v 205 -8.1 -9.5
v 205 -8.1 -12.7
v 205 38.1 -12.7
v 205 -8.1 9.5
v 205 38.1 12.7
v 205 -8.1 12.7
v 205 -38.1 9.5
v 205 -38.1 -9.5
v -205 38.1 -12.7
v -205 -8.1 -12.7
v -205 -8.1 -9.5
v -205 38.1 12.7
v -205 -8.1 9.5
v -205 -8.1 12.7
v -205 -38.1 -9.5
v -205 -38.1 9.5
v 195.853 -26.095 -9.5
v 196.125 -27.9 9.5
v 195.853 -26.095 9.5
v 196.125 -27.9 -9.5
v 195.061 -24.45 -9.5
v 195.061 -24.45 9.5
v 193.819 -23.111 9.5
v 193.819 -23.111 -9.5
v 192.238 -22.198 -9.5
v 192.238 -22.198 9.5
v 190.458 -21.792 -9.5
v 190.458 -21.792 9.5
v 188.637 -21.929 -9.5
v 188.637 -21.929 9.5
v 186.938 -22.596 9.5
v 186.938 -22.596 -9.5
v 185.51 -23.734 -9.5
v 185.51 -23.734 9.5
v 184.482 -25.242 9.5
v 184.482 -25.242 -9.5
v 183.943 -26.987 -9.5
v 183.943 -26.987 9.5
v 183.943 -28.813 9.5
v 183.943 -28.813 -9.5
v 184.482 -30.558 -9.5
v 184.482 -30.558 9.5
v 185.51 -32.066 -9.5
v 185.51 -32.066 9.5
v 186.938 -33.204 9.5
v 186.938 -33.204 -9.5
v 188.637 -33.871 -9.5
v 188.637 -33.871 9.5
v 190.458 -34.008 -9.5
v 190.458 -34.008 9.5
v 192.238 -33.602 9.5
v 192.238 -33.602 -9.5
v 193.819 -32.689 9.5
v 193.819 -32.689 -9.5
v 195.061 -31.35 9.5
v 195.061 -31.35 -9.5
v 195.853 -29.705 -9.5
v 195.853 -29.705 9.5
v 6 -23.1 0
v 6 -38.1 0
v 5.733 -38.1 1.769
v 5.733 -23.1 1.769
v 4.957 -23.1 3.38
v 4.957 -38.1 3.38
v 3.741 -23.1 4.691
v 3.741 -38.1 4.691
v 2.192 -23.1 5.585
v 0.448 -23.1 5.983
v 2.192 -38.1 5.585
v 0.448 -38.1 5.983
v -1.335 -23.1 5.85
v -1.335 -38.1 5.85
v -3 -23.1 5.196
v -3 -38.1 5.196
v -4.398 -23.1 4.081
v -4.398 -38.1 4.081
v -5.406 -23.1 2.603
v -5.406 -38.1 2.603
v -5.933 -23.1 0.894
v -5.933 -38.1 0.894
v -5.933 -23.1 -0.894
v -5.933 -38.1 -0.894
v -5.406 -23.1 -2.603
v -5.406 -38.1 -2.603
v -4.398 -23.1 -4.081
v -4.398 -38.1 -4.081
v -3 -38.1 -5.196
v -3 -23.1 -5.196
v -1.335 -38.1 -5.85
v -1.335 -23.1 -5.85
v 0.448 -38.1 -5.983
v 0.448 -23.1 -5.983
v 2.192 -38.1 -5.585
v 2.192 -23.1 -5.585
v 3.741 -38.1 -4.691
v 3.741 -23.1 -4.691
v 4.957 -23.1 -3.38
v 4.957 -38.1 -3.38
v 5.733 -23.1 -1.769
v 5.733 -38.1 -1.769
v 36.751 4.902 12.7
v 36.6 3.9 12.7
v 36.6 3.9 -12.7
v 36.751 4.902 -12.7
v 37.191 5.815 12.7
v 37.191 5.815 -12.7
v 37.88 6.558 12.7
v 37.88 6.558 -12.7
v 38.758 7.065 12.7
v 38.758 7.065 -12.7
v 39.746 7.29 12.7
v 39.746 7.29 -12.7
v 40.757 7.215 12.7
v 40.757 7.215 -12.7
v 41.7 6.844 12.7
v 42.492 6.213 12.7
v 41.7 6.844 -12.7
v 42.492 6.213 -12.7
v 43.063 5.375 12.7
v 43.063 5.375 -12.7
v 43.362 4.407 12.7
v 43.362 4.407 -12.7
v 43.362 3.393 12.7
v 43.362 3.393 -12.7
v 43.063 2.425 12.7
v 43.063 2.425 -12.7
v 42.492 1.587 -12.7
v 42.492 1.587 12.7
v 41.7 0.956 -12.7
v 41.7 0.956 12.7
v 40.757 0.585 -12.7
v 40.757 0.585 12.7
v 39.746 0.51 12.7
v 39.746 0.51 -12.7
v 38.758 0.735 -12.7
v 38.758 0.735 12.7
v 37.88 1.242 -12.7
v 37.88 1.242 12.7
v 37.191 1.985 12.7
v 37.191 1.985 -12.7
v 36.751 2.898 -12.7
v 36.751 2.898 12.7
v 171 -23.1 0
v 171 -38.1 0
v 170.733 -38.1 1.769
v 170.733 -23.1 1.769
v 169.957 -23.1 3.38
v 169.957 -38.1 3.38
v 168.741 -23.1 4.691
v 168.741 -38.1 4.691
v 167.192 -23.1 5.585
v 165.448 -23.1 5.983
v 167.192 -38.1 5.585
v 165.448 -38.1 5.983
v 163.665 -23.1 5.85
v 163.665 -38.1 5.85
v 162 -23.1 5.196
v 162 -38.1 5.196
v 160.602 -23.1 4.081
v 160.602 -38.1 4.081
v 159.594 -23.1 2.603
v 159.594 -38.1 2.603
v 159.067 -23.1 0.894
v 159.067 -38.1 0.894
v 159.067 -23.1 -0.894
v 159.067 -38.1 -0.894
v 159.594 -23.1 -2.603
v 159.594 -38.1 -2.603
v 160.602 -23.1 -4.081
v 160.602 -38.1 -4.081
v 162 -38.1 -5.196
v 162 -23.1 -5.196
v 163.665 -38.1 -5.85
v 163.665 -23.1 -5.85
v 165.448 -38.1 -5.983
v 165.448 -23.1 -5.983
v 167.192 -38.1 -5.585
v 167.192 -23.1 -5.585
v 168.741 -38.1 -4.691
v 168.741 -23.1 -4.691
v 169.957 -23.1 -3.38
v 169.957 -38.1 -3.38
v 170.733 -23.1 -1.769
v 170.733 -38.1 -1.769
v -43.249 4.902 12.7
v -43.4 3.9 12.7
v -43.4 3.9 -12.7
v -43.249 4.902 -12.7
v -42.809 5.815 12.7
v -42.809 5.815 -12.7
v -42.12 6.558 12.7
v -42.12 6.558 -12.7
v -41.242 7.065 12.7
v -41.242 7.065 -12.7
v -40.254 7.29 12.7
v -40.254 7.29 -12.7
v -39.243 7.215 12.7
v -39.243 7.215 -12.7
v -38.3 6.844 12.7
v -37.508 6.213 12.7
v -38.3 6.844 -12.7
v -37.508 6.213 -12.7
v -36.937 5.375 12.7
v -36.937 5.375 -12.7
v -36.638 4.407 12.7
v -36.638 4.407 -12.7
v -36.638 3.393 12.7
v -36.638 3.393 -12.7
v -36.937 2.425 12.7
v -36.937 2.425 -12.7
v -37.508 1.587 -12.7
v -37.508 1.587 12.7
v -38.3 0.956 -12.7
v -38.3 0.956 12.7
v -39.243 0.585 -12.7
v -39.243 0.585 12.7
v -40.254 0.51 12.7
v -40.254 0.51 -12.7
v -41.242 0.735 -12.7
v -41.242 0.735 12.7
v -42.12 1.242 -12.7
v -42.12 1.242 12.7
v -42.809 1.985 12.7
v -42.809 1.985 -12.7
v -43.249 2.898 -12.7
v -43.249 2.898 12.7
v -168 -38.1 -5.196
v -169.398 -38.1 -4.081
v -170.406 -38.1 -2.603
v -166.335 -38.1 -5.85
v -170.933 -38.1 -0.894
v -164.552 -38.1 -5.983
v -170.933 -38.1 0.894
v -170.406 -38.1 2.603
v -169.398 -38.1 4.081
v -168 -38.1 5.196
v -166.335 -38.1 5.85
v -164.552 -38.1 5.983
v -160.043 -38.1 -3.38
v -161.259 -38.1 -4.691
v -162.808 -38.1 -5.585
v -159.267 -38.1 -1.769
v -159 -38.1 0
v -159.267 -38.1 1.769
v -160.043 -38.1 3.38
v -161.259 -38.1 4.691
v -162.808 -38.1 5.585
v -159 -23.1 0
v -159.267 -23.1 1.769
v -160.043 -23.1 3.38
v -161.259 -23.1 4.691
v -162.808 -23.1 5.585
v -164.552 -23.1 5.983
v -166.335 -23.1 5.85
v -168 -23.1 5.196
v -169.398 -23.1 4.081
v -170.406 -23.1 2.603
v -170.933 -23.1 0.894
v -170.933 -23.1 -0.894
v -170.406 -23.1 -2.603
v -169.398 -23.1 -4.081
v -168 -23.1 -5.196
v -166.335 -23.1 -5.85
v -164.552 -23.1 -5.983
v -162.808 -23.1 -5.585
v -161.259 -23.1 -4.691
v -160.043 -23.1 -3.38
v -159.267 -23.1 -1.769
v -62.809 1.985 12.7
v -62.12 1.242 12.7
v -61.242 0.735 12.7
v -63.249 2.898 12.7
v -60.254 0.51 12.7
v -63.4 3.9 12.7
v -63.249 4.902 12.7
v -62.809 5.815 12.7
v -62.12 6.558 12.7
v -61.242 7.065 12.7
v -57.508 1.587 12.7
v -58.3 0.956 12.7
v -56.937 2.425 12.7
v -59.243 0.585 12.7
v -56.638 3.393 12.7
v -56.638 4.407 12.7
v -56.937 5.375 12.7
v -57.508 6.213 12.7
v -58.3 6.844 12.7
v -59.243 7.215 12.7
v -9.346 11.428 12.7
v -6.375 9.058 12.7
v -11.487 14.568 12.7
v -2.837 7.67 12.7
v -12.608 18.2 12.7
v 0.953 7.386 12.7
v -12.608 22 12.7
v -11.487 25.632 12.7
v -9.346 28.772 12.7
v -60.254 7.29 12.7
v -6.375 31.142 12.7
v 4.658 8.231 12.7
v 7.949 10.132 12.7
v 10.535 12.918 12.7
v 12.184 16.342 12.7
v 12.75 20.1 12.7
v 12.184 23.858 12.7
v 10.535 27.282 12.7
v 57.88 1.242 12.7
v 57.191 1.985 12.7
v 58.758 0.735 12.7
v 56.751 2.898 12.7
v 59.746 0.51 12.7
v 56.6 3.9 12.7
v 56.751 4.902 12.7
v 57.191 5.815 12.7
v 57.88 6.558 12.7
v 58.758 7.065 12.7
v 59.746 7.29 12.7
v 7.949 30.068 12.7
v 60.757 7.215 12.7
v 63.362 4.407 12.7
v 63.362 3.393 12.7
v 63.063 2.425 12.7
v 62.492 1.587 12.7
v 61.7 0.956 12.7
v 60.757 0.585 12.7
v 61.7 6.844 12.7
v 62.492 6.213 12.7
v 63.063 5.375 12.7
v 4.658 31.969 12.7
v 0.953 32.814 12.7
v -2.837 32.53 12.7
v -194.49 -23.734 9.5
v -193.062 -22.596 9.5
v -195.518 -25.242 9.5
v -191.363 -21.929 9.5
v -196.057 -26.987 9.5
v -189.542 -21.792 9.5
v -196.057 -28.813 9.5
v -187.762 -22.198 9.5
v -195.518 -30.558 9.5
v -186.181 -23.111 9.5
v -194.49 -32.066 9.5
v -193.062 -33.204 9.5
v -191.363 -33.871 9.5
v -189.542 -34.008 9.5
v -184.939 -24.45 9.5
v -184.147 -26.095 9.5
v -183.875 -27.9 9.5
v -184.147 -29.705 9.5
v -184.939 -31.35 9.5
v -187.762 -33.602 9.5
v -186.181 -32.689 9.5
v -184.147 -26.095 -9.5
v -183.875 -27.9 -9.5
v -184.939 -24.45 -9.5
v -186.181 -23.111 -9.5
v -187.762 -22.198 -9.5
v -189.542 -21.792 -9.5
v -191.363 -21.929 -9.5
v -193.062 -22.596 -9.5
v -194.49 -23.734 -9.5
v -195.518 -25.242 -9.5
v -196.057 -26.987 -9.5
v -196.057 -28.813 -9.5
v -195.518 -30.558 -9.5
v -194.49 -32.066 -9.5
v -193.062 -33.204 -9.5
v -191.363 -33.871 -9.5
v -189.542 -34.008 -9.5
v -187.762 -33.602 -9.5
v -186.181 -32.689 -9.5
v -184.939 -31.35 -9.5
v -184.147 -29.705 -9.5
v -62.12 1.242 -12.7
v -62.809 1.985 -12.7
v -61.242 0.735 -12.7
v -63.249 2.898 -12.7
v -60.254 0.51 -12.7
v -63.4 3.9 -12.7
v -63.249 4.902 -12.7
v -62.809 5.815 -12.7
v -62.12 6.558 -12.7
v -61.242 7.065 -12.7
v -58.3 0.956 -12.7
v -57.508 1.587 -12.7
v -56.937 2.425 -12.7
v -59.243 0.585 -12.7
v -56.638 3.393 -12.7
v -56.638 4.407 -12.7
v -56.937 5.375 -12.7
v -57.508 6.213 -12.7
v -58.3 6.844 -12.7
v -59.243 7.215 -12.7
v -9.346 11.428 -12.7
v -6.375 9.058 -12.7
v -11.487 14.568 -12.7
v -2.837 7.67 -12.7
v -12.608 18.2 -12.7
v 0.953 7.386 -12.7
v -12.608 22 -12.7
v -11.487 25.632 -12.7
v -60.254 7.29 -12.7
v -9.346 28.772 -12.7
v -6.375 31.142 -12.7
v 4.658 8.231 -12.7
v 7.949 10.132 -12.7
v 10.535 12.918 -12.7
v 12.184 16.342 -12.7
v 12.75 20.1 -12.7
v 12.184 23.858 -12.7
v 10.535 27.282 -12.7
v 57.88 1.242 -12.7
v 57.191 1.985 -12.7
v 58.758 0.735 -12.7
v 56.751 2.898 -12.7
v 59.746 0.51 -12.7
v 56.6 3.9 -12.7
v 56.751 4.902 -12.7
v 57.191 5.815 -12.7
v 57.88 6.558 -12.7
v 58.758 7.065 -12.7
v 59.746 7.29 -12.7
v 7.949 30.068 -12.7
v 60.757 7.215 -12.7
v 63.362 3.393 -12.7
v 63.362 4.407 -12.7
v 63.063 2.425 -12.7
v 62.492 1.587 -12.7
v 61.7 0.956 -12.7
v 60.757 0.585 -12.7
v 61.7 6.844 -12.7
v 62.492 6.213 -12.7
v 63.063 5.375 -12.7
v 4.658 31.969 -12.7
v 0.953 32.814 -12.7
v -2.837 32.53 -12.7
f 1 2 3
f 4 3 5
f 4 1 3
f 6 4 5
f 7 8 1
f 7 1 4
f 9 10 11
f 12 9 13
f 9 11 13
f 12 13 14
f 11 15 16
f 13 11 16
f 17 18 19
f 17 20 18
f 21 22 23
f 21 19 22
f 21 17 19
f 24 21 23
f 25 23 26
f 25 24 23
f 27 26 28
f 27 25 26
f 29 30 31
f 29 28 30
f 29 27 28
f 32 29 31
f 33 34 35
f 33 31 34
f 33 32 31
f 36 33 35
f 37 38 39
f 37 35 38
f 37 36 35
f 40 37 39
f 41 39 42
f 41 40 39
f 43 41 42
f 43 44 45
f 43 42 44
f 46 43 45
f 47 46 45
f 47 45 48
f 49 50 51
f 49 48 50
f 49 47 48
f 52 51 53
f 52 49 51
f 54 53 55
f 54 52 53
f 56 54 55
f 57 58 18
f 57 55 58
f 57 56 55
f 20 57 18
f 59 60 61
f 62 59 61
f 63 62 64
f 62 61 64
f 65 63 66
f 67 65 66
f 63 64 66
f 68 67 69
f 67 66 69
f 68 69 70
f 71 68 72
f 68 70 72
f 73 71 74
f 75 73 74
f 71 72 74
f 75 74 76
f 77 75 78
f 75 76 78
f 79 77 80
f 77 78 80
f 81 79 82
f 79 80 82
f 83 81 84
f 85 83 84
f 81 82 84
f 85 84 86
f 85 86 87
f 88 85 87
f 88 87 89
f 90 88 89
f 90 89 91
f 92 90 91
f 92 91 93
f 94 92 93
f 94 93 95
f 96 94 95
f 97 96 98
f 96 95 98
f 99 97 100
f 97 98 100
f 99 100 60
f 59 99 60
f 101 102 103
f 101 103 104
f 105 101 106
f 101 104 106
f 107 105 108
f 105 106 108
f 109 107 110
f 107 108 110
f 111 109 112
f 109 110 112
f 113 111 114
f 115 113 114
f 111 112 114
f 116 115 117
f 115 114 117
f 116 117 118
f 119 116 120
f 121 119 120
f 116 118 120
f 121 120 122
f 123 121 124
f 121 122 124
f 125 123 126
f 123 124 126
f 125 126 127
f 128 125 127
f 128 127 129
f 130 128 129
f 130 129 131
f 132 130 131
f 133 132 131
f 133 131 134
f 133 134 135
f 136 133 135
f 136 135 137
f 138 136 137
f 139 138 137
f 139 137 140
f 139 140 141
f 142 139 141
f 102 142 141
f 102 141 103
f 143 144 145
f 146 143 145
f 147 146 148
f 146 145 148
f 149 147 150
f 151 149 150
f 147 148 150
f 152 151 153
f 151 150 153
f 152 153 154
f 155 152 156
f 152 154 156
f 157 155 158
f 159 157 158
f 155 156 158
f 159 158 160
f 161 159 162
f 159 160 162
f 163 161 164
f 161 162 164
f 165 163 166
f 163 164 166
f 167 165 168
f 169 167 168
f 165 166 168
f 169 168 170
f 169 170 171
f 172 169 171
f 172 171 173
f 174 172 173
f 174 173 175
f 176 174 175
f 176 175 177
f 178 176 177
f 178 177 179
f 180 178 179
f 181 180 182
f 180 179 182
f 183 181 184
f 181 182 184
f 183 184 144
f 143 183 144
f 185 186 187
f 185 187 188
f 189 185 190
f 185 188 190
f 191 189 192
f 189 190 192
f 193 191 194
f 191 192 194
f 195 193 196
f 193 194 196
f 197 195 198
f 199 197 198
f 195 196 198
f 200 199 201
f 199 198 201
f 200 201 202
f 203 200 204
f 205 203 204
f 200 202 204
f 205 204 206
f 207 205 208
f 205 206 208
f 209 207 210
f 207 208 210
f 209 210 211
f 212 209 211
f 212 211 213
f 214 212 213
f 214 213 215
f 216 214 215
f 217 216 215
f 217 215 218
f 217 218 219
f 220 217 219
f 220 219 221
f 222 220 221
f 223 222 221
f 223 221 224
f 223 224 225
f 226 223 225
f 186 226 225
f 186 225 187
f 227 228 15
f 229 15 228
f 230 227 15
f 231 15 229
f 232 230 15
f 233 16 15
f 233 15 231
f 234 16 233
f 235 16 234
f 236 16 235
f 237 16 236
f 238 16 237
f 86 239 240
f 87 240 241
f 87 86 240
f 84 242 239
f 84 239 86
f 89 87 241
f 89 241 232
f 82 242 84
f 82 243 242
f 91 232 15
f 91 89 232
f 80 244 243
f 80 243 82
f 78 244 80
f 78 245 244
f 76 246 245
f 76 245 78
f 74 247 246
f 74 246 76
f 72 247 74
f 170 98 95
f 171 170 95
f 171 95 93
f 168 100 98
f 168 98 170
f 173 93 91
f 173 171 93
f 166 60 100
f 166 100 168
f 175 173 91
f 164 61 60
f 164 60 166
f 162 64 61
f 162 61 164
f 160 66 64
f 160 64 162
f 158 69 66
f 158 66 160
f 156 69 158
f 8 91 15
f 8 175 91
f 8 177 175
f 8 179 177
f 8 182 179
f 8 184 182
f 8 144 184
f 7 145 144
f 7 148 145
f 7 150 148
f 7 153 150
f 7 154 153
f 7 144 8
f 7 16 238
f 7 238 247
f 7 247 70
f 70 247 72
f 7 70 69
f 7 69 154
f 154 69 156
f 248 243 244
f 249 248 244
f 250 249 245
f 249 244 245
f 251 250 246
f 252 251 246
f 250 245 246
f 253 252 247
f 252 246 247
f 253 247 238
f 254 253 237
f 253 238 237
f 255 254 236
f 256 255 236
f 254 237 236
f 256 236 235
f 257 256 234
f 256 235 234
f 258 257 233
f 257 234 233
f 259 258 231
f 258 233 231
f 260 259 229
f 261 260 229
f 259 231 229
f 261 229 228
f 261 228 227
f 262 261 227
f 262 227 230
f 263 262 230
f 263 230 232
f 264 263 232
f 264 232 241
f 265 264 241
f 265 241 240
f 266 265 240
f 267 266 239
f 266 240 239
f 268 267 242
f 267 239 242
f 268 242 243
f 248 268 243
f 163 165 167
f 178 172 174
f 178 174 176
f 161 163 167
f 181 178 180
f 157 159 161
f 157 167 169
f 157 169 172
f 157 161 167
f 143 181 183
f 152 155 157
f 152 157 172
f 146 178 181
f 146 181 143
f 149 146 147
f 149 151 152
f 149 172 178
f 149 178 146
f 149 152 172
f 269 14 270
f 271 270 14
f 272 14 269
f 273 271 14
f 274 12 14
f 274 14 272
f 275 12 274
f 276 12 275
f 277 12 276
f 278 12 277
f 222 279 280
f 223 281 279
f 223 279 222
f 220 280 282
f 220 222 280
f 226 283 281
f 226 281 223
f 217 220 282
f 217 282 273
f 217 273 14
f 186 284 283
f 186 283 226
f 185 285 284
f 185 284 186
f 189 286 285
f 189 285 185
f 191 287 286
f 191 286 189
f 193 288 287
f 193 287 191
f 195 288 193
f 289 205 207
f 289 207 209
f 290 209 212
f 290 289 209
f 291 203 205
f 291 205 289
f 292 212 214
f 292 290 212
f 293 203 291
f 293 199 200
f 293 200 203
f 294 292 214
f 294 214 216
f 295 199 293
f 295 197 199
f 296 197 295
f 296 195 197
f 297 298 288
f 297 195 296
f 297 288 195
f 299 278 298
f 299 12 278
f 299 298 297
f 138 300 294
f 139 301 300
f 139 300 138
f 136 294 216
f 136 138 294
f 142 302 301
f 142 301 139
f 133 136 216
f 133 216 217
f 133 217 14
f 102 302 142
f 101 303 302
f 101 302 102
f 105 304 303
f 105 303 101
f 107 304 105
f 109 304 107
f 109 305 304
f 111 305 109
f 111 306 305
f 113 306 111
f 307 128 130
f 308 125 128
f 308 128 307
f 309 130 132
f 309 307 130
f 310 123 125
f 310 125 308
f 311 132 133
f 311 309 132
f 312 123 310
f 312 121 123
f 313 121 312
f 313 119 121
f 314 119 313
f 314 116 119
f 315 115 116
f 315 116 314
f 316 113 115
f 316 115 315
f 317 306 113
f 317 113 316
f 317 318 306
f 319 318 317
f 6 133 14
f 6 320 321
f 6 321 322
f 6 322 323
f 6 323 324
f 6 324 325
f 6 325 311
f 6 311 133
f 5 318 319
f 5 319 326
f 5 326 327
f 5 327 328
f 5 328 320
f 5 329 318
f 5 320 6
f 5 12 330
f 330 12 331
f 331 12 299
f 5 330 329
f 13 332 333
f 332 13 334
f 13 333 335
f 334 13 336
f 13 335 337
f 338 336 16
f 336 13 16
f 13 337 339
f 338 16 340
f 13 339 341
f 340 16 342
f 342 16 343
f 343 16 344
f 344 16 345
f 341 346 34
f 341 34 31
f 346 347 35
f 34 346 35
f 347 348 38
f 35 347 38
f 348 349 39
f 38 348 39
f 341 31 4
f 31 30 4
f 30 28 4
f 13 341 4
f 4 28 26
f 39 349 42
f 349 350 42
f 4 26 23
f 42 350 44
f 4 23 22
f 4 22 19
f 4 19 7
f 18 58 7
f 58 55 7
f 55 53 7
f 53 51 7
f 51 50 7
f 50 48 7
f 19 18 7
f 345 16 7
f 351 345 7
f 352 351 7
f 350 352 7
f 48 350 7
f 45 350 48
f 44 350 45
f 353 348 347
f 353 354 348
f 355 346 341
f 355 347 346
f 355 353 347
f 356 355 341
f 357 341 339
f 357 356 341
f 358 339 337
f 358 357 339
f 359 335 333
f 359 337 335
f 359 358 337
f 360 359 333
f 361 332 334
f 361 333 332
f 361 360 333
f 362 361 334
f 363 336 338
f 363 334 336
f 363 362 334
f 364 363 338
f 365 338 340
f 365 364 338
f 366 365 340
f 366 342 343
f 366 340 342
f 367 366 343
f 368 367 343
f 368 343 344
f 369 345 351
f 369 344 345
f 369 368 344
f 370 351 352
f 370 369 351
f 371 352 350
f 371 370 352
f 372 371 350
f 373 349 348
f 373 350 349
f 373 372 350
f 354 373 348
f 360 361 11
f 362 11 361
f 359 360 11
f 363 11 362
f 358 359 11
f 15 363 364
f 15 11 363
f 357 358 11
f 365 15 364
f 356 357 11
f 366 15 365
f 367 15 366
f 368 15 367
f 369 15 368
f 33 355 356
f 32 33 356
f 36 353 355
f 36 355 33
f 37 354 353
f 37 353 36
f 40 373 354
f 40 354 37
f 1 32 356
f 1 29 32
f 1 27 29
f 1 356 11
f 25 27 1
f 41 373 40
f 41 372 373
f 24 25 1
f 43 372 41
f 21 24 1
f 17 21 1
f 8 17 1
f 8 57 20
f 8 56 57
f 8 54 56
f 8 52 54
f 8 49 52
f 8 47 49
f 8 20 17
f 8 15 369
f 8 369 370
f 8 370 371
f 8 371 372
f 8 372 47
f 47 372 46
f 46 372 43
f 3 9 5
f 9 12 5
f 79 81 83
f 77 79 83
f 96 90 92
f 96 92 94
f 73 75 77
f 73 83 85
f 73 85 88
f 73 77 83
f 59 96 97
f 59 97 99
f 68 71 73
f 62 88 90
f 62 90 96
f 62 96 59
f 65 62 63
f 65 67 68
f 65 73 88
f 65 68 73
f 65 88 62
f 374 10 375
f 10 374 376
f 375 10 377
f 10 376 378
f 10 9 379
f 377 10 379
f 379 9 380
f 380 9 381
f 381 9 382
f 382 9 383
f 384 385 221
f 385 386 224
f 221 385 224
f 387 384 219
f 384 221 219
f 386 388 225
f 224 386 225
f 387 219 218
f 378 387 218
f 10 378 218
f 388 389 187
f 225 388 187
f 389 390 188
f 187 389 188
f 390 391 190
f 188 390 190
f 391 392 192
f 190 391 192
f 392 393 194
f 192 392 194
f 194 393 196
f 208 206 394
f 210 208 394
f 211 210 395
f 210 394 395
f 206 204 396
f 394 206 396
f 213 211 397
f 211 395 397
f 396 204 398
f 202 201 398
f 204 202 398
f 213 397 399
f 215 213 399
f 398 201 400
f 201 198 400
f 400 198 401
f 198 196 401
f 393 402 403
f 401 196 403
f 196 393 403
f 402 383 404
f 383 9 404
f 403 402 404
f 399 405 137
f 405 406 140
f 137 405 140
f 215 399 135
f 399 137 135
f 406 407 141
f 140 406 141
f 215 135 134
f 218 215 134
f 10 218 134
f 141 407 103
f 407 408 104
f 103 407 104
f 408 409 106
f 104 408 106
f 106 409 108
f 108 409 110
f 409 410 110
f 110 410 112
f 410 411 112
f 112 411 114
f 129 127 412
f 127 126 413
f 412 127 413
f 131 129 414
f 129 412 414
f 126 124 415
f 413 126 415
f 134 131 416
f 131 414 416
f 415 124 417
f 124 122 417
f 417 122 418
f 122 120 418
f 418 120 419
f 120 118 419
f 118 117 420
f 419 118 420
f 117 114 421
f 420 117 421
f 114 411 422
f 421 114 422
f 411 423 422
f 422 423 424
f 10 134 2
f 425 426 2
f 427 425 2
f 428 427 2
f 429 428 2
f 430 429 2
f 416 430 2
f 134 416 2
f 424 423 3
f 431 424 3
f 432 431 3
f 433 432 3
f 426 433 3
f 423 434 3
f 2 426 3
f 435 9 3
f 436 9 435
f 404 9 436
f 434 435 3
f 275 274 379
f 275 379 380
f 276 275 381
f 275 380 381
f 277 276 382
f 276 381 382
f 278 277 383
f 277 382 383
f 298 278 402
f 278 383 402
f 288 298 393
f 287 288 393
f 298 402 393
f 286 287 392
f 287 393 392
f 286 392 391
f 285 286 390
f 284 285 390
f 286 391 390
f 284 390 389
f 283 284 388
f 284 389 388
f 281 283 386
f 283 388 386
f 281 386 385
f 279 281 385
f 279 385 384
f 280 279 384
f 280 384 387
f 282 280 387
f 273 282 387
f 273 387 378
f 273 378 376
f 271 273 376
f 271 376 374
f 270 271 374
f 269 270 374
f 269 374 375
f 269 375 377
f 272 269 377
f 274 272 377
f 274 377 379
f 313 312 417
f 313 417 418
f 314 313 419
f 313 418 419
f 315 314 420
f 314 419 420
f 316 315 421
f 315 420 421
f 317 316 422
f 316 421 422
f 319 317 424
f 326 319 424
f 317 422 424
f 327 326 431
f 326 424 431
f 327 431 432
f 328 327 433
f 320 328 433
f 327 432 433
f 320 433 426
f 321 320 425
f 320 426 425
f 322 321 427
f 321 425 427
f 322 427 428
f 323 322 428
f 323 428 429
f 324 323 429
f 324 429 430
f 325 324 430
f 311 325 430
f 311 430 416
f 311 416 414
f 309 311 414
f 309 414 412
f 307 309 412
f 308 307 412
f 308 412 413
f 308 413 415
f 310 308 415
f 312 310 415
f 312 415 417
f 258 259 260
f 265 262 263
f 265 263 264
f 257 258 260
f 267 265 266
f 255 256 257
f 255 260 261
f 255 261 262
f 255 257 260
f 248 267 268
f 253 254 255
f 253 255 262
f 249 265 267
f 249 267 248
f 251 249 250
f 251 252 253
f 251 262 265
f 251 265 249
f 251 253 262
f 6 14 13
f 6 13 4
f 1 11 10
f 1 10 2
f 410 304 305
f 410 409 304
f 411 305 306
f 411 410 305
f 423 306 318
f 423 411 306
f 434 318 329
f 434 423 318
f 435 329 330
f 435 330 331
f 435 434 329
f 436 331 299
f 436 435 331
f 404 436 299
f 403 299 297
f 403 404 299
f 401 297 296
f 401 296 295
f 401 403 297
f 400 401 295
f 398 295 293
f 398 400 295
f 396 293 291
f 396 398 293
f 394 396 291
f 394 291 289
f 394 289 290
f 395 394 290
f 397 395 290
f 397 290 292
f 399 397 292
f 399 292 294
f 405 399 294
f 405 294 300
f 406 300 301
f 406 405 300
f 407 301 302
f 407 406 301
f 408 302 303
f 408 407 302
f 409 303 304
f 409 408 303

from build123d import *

# Parameters (mm, degrees)
SKETCH1_W           = 410
SKETCH1_H           = 76.2
SKETCH1_R           = 12.75
SKETCH1_R_2         = 6.125
BOSS_EXTRUDE1_DEPTH = 12.7
SKETCH2_R           = 6
CUT_EXTRUDE1_DEPTH  = 15
SKETCH4_OUTSIDE_W   = 495.558
SKETCH4_OUTSIDE_H   = 110.958
SKETCH4_OUTSIDE_W_2 = 410
SKETCH4_OUTSIDE_H_2 = 19
CUT_EXTRUDE2_DEPTH  = 30
M8_TAPPED_HOLE1_D   = 6.8


with BuildPart() as part:
    # Sketch1 → Boss-Extrude1 (new body, symmetric)
    with BuildSketch(Plane.XY):
        Rectangle(SKETCH1_W, SKETCH1_H)
        with Locations((0, 20.1)):
            Circle(SKETCH1_R, mode=Mode.SUBTRACT)
        with Locations((190, -27.9)):
            Circle(SKETCH1_R_2, mode=Mode.SUBTRACT)
        with Locations((-190, -27.9)):
            Circle(SKETCH1_R_2, mode=Mode.SUBTRACT)
    extrude(amount=BOSS_EXTRUDE1_DEPTH, both=True)

    # Sketch2 → Cut-Extrude1 (cut)
    with BuildSketch(Plane.XZ.offset(38.1)):
        Circle(SKETCH2_R)
        with Locations((-165, 0)):
            Circle(SKETCH2_R)
        with Locations((165, 0)):
            Circle(SKETCH2_R)
    extrude(amount=-CUT_EXTRUDE1_DEPTH, mode=Mode.SUBTRACT)

    # Sketch4 outside → Cut-Extrude2 (cut)
    with BuildSketch(Plane.XZ.offset(38.1)):
        Rectangle(SKETCH4_OUTSIDE_W, SKETCH4_OUTSIDE_H)
        Rectangle(SKETCH4_OUTSIDE_W_2, SKETCH4_OUTSIDE_H_2, mode=Mode.SUBTRACT)
    extrude(amount=-CUT_EXTRUDE2_DEPTH, mode=Mode.SUBTRACT)

    # M8 Tapped Hole1 (through all)
    with Locations(Plane.XY.offset(12.7)):
        with Locations((-60, 3.9), (-40, 3.9), (40, 3.9), (60, 3.9)):
            Hole(M8_TAPPED_HOLE1_D / 2)


solid = part.part
